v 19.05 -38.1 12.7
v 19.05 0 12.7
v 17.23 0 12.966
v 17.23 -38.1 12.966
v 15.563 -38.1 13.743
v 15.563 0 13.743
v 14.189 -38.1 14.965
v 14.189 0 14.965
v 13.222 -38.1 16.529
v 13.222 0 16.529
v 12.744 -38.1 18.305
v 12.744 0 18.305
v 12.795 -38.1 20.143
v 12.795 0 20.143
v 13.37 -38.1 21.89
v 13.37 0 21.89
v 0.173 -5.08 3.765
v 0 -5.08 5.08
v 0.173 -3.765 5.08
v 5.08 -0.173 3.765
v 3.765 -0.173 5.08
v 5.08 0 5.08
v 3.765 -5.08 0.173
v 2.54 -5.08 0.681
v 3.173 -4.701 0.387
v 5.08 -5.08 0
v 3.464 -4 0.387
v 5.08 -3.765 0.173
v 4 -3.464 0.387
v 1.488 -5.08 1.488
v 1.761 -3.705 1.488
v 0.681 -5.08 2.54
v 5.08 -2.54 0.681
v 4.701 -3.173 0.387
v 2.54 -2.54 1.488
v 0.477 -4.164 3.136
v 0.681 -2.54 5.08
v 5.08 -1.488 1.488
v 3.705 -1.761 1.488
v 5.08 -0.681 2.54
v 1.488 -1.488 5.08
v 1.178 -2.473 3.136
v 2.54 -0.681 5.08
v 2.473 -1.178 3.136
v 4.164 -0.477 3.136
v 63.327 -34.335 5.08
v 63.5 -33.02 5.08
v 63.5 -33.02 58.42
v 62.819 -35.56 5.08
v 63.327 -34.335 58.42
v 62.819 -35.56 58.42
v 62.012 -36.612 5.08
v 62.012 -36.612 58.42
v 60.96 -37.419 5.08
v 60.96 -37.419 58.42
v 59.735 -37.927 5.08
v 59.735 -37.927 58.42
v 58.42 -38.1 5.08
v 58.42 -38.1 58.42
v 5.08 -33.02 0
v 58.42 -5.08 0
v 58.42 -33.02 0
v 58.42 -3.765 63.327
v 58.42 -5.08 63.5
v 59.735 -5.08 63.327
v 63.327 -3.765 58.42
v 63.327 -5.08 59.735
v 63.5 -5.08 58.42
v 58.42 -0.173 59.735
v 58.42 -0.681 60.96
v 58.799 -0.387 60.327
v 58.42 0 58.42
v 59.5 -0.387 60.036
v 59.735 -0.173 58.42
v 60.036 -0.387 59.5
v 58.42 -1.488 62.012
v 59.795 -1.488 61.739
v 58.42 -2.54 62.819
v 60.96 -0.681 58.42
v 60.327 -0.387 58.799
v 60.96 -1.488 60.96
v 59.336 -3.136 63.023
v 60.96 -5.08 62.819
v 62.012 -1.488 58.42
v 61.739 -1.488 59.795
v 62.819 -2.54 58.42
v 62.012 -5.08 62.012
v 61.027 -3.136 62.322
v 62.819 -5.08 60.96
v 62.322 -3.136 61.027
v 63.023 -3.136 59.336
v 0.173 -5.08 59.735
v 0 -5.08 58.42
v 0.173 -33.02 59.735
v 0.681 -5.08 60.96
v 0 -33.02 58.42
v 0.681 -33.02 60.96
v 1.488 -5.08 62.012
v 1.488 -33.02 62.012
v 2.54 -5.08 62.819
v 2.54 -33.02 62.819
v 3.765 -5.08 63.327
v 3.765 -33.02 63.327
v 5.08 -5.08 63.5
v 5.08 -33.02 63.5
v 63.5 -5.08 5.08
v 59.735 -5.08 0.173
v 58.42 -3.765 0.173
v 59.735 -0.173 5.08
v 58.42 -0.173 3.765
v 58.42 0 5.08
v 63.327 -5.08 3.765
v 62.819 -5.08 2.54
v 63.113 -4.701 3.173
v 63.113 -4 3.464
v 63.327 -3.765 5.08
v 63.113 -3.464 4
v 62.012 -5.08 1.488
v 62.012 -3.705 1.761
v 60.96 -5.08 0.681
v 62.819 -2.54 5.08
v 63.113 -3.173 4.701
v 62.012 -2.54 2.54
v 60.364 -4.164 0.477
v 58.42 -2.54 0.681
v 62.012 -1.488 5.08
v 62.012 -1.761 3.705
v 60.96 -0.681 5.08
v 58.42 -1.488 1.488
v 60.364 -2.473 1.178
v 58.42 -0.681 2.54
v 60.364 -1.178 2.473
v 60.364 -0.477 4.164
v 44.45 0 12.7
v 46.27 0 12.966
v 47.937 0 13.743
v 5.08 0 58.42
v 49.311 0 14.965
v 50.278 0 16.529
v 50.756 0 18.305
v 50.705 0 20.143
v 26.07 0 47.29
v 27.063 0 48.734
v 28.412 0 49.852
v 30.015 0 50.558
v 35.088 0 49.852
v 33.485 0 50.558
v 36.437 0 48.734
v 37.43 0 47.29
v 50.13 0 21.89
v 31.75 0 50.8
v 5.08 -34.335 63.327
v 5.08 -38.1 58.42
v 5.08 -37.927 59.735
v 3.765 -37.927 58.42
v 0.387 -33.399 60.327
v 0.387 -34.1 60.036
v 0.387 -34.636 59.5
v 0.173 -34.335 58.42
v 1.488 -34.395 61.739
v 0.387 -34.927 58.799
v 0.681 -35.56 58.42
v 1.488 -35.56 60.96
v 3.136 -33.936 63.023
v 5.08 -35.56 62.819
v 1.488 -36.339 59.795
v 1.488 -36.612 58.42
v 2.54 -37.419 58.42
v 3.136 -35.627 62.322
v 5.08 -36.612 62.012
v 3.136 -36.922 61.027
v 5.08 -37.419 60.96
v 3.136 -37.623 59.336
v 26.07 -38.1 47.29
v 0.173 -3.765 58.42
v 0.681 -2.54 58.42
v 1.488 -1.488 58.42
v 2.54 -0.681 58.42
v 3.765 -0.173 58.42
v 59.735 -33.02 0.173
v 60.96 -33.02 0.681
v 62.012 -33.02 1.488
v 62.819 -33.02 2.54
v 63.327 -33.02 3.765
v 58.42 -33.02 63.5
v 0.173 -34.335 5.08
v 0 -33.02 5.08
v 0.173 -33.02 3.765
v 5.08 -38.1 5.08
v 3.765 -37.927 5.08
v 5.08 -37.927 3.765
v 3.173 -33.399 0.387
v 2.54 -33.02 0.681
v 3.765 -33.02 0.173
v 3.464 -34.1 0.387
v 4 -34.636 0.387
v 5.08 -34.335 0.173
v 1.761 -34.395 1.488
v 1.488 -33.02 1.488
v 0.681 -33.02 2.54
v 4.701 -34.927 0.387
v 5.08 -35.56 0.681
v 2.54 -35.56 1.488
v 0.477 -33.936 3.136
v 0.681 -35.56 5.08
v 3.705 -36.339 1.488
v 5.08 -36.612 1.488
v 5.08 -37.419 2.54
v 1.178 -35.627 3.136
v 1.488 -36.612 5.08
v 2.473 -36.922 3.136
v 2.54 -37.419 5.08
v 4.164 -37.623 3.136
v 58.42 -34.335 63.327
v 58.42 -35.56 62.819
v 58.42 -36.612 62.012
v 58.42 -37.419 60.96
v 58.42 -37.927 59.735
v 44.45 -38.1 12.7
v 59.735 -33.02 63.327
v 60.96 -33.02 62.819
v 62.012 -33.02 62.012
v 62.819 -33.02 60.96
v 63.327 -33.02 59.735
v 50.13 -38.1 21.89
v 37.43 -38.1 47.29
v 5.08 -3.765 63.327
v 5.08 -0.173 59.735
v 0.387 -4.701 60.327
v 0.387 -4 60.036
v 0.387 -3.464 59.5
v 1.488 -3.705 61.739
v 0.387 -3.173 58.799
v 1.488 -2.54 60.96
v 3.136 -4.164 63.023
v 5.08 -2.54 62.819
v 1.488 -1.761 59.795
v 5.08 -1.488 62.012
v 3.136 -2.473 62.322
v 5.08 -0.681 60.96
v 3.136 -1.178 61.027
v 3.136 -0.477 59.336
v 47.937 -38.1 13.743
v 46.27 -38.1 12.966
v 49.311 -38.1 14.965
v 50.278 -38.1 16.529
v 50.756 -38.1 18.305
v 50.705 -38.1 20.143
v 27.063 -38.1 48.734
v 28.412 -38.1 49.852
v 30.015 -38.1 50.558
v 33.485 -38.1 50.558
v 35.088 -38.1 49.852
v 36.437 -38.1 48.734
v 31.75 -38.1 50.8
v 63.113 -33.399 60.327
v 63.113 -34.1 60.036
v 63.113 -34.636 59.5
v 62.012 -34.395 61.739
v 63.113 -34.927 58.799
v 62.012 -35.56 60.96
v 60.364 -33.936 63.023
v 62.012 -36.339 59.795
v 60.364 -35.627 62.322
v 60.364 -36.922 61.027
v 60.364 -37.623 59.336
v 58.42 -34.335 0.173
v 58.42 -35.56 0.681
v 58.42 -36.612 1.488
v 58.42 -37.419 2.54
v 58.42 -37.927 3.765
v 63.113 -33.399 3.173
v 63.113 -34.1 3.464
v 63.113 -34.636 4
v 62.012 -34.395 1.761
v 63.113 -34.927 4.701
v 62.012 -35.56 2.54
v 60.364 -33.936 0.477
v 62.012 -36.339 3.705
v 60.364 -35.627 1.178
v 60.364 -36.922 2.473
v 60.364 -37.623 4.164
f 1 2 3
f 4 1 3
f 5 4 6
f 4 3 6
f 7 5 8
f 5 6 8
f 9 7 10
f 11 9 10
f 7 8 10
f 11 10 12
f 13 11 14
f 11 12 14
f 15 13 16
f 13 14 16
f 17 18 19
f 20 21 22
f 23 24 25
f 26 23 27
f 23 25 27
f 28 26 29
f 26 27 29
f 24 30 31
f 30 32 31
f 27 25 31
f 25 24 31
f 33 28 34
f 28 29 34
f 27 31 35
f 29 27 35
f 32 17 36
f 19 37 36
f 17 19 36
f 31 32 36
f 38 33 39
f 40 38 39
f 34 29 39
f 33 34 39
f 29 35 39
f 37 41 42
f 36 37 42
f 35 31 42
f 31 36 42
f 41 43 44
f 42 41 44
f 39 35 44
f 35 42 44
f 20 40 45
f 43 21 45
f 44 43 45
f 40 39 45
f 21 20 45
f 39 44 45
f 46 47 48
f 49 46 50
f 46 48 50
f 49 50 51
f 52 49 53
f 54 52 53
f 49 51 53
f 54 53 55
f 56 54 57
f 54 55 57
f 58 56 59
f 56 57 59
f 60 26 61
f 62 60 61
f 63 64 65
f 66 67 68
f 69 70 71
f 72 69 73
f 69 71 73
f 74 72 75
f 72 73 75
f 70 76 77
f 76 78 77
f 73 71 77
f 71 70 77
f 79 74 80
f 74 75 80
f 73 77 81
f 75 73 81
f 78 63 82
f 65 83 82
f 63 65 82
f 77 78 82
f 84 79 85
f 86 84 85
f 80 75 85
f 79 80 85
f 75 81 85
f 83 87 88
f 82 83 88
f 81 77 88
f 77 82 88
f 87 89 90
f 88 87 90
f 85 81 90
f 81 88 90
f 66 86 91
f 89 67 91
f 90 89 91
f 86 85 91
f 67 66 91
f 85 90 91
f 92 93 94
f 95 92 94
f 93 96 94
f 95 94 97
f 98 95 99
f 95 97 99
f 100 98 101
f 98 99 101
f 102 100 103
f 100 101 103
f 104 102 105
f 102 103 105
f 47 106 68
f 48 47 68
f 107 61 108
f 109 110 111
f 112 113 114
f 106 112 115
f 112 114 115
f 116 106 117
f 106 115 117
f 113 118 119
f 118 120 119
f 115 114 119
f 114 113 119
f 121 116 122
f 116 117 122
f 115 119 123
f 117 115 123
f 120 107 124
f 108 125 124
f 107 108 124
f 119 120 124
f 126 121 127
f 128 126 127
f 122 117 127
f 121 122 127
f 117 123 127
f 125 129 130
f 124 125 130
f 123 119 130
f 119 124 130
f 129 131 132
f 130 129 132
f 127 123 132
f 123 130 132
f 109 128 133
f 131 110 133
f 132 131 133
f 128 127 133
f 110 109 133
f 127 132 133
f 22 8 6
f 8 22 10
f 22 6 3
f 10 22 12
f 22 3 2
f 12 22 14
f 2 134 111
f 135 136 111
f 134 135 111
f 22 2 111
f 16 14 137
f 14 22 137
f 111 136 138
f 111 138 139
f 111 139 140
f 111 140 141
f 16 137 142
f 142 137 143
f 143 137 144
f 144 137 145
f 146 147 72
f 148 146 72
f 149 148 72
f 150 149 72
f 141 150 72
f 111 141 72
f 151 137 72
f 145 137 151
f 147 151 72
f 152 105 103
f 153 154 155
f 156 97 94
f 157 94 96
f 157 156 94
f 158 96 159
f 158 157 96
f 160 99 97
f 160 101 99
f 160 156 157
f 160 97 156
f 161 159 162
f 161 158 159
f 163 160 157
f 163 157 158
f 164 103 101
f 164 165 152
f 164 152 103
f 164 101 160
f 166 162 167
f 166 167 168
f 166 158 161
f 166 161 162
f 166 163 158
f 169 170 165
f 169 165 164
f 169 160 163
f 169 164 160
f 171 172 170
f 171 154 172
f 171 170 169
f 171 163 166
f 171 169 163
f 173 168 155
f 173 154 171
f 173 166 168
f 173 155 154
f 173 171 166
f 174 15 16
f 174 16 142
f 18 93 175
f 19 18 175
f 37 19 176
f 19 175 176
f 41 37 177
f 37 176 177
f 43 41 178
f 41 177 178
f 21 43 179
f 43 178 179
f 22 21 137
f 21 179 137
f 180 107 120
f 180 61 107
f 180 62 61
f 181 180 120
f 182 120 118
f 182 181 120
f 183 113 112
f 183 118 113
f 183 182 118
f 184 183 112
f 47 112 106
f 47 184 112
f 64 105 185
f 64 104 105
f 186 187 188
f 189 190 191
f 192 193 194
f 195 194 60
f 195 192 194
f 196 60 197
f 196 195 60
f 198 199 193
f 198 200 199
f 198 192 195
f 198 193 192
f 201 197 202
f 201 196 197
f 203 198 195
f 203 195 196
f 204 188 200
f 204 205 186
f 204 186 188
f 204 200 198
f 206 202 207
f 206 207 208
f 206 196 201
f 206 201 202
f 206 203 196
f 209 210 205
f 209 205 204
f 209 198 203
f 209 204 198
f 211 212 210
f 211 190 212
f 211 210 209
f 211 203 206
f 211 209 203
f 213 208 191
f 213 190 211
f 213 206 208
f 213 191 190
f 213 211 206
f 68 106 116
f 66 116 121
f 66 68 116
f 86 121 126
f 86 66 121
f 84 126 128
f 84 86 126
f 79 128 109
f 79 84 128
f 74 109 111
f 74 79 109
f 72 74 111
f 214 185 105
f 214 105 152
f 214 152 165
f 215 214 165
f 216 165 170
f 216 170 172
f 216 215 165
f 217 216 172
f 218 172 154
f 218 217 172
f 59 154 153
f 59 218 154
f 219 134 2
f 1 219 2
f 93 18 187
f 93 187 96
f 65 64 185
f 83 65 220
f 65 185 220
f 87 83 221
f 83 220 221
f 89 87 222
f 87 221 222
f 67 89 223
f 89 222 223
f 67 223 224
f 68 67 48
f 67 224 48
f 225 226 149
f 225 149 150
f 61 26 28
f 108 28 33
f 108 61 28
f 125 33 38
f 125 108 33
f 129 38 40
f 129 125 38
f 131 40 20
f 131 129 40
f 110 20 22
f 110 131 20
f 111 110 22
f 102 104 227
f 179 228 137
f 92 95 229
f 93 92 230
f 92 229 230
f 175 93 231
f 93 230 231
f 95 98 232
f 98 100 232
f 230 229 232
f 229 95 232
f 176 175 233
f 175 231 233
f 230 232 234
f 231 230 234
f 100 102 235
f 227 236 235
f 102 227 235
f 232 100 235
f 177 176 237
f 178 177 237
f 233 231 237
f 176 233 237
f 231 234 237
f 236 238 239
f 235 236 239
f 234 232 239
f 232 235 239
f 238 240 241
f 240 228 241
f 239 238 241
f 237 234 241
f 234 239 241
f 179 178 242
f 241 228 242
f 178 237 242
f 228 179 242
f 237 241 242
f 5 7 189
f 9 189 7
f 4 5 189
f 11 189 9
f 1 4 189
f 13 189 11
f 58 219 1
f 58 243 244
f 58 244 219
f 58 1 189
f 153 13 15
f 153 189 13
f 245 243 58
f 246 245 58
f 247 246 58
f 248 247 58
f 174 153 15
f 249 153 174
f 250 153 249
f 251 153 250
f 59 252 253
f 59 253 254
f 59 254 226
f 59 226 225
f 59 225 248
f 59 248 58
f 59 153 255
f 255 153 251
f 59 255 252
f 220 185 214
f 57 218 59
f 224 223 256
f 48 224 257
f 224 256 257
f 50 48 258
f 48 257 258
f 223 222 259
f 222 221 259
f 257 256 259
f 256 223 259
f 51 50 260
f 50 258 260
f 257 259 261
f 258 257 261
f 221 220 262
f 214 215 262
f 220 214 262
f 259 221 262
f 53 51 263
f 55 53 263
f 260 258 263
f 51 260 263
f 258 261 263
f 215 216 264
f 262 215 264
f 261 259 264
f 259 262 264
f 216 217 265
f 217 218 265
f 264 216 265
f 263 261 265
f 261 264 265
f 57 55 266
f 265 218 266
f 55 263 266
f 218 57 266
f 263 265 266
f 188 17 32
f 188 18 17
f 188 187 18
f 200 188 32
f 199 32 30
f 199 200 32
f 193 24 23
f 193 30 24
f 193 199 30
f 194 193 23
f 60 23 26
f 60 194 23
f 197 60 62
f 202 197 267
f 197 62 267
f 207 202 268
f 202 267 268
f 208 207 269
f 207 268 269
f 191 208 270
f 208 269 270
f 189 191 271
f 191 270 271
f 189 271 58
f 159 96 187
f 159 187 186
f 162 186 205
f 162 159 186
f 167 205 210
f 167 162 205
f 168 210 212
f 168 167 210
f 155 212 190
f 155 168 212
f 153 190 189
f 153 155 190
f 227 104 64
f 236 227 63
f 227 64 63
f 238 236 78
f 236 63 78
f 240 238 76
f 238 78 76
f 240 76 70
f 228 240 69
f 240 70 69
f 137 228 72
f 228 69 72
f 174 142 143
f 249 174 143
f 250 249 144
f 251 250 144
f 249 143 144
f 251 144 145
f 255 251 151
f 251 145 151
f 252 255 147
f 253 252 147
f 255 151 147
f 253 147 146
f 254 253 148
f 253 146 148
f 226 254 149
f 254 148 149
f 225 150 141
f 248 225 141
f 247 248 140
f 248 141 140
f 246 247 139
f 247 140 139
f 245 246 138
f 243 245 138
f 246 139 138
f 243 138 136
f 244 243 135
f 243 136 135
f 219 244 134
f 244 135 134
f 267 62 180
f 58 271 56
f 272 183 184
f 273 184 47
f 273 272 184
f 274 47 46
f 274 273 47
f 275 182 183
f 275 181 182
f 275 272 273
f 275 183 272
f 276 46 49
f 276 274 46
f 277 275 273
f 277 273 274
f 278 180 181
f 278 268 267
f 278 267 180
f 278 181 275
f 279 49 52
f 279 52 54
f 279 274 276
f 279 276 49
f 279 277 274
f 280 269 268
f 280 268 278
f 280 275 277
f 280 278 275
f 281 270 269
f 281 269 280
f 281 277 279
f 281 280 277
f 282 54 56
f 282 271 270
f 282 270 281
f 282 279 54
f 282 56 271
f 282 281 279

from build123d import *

# Parameters (mm, degrees)
F0_W     = 63.5
F0_H     = 63.5
F1_DEPTH = 38.1
F2_R     = 5.08


with BuildPart() as f1:
    # F0 (on Front) → F1 (new body)
    with BuildSketch(Plane.XZ):
        with Locations((31.75, 31.75)):
            Rectangle(F0_W, F0_H)
        with BuildLine():
            ThreePointArc((19.05, 12.7), (13.648367, 15.711607), (13.370387, 21.889806))
            Line((13.370387, 21.889806), (26.070387, 47.289806))
            ThreePointArc((26.070387, 47.289806), (31.75, 50.8), (37.429613, 47.289806))
            Line((37.429613, 47.289806), (50.129613, 21.889806))
            ThreePointArc((50.129613, 21.889806), (49.851633, 15.711607), (44.45, 12.7))
            Line((44.45, 12.7), (19.05, 12.7))
        make_face(mode=Mode.SUBTRACT)
    extrude(amount=F1_DEPTH)

    # F2
    f2_edges = [f1.edges().sort_by_distance(p)[0] for p in [
        (31.75, -38.1, 63.5),
        (63.5, -19.05, 63.5),
        (31.75, 0, 63.5),
        (0, -19.05, 63.5),
        (0, 0, 31.75),
        (0, -38.1, 31.75),
        (0, -19.05, 0),
        (31.75, 0, 0),
        (31.75, -38.1, 0),
        (63.5, -19.05, 0),
        (63.5, 0, 31.75),
        (63.5, -38.1, 31.75),
    ]]
    fillet(f2_edges, radius=F2_R)


solid = f1.part
